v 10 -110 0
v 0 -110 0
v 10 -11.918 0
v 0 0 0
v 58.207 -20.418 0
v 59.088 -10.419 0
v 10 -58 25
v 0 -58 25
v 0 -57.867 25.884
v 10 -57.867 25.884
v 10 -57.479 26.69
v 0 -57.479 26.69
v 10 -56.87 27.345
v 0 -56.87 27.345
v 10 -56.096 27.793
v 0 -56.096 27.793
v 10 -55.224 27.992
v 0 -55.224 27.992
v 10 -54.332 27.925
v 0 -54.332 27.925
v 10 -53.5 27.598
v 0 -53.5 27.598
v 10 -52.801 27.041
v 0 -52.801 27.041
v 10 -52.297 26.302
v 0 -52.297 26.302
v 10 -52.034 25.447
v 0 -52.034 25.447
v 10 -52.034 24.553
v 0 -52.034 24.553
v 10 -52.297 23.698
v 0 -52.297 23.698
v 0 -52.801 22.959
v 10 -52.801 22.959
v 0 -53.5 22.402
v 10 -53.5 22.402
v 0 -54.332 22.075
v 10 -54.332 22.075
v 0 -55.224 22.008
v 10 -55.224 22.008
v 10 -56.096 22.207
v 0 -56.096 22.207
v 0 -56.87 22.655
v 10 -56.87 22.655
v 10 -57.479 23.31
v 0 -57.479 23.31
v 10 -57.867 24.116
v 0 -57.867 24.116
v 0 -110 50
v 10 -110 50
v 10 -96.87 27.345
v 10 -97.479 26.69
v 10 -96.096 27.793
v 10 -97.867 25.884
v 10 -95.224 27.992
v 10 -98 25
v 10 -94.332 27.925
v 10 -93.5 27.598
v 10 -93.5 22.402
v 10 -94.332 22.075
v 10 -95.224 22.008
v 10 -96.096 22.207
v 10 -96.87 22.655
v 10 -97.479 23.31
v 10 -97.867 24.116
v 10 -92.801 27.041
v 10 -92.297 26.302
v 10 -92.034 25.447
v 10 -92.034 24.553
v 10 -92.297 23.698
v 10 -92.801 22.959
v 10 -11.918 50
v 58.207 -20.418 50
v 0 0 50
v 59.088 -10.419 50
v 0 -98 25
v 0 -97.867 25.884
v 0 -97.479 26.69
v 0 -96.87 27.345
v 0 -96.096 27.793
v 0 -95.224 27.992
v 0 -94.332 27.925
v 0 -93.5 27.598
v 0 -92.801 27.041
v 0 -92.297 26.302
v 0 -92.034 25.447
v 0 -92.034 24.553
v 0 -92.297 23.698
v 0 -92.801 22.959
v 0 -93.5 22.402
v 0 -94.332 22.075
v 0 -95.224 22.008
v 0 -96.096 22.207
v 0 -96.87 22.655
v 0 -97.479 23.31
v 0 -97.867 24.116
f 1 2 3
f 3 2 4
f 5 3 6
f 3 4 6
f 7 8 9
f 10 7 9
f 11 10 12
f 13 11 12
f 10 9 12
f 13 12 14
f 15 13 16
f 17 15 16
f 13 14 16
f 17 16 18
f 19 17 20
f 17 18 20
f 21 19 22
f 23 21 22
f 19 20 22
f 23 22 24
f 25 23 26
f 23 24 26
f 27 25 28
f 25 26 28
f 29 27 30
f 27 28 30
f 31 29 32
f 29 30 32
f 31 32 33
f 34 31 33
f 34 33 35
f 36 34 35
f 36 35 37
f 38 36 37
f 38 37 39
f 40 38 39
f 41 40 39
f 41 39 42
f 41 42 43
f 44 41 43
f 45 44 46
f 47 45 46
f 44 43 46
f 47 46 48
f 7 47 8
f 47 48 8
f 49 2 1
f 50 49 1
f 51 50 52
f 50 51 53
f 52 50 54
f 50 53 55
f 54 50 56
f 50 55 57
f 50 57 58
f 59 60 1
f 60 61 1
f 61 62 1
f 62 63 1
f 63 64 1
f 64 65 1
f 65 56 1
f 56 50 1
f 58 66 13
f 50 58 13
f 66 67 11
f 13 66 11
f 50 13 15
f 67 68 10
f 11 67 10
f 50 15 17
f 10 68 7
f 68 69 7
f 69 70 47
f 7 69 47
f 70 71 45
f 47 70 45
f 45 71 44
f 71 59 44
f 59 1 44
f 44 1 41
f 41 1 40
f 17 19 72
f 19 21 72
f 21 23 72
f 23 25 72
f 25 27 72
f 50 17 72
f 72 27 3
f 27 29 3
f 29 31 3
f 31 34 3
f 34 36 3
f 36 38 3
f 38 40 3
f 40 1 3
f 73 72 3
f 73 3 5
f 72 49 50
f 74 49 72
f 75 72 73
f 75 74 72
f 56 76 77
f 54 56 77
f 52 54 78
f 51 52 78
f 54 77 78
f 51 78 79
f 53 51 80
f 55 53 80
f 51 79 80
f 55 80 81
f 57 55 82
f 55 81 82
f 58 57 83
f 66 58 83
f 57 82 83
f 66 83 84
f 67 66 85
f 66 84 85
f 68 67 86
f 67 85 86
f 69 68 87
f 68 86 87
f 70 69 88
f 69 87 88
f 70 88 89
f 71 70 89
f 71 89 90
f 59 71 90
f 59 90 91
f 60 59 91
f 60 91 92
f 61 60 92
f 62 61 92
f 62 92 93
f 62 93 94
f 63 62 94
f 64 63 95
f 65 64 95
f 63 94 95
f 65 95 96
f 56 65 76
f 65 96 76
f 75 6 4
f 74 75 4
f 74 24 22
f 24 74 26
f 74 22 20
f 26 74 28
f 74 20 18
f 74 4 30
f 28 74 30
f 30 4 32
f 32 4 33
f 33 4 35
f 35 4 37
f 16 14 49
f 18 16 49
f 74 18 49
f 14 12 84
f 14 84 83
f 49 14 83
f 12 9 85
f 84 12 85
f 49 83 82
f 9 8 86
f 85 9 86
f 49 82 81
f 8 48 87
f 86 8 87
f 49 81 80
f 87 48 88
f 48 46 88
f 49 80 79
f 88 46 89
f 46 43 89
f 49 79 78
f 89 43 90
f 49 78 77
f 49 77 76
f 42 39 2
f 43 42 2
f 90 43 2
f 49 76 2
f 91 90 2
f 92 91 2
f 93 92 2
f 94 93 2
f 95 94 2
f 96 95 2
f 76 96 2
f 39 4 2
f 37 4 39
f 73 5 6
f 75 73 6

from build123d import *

# Parameters (mm, degrees)
BOSS_EXTRU_1_DEPTH      = 50
ESQUISSE2_R             = 3
ENL_V_MAT_EXTRU_1_DEPTH = 10


with BuildPart() as part:
    # Esquisse1 → Boss.-Extru.1 (new body)
    with BuildSketch(Plane.XY):
        Polygon((0, 0), (0, -110), (10, -110), (10, -11.917535926), (58.206757919, -20.417687999), (59.088465181, -10.41889066), align=None)
    extrude(amount=BOSS_EXTRU_1_DEPTH)

    # Esquisse2 → Enlèv. mat.-Extru.1 (cut)
    with BuildSketch(Plane.ZY):
        with Locations(Location((25, -95, 0), (0, 0, 270))):
            Circle(ESQUISSE2_R)
        with Locations(Location((25, -55, 0), (0, 0, 270))):
            Circle(ESQUISSE2_R)
    extrude(amount=-ENL_V_MAT_EXTRU_1_DEPTH, mode=Mode.SUBTRACT)


solid = part.part
